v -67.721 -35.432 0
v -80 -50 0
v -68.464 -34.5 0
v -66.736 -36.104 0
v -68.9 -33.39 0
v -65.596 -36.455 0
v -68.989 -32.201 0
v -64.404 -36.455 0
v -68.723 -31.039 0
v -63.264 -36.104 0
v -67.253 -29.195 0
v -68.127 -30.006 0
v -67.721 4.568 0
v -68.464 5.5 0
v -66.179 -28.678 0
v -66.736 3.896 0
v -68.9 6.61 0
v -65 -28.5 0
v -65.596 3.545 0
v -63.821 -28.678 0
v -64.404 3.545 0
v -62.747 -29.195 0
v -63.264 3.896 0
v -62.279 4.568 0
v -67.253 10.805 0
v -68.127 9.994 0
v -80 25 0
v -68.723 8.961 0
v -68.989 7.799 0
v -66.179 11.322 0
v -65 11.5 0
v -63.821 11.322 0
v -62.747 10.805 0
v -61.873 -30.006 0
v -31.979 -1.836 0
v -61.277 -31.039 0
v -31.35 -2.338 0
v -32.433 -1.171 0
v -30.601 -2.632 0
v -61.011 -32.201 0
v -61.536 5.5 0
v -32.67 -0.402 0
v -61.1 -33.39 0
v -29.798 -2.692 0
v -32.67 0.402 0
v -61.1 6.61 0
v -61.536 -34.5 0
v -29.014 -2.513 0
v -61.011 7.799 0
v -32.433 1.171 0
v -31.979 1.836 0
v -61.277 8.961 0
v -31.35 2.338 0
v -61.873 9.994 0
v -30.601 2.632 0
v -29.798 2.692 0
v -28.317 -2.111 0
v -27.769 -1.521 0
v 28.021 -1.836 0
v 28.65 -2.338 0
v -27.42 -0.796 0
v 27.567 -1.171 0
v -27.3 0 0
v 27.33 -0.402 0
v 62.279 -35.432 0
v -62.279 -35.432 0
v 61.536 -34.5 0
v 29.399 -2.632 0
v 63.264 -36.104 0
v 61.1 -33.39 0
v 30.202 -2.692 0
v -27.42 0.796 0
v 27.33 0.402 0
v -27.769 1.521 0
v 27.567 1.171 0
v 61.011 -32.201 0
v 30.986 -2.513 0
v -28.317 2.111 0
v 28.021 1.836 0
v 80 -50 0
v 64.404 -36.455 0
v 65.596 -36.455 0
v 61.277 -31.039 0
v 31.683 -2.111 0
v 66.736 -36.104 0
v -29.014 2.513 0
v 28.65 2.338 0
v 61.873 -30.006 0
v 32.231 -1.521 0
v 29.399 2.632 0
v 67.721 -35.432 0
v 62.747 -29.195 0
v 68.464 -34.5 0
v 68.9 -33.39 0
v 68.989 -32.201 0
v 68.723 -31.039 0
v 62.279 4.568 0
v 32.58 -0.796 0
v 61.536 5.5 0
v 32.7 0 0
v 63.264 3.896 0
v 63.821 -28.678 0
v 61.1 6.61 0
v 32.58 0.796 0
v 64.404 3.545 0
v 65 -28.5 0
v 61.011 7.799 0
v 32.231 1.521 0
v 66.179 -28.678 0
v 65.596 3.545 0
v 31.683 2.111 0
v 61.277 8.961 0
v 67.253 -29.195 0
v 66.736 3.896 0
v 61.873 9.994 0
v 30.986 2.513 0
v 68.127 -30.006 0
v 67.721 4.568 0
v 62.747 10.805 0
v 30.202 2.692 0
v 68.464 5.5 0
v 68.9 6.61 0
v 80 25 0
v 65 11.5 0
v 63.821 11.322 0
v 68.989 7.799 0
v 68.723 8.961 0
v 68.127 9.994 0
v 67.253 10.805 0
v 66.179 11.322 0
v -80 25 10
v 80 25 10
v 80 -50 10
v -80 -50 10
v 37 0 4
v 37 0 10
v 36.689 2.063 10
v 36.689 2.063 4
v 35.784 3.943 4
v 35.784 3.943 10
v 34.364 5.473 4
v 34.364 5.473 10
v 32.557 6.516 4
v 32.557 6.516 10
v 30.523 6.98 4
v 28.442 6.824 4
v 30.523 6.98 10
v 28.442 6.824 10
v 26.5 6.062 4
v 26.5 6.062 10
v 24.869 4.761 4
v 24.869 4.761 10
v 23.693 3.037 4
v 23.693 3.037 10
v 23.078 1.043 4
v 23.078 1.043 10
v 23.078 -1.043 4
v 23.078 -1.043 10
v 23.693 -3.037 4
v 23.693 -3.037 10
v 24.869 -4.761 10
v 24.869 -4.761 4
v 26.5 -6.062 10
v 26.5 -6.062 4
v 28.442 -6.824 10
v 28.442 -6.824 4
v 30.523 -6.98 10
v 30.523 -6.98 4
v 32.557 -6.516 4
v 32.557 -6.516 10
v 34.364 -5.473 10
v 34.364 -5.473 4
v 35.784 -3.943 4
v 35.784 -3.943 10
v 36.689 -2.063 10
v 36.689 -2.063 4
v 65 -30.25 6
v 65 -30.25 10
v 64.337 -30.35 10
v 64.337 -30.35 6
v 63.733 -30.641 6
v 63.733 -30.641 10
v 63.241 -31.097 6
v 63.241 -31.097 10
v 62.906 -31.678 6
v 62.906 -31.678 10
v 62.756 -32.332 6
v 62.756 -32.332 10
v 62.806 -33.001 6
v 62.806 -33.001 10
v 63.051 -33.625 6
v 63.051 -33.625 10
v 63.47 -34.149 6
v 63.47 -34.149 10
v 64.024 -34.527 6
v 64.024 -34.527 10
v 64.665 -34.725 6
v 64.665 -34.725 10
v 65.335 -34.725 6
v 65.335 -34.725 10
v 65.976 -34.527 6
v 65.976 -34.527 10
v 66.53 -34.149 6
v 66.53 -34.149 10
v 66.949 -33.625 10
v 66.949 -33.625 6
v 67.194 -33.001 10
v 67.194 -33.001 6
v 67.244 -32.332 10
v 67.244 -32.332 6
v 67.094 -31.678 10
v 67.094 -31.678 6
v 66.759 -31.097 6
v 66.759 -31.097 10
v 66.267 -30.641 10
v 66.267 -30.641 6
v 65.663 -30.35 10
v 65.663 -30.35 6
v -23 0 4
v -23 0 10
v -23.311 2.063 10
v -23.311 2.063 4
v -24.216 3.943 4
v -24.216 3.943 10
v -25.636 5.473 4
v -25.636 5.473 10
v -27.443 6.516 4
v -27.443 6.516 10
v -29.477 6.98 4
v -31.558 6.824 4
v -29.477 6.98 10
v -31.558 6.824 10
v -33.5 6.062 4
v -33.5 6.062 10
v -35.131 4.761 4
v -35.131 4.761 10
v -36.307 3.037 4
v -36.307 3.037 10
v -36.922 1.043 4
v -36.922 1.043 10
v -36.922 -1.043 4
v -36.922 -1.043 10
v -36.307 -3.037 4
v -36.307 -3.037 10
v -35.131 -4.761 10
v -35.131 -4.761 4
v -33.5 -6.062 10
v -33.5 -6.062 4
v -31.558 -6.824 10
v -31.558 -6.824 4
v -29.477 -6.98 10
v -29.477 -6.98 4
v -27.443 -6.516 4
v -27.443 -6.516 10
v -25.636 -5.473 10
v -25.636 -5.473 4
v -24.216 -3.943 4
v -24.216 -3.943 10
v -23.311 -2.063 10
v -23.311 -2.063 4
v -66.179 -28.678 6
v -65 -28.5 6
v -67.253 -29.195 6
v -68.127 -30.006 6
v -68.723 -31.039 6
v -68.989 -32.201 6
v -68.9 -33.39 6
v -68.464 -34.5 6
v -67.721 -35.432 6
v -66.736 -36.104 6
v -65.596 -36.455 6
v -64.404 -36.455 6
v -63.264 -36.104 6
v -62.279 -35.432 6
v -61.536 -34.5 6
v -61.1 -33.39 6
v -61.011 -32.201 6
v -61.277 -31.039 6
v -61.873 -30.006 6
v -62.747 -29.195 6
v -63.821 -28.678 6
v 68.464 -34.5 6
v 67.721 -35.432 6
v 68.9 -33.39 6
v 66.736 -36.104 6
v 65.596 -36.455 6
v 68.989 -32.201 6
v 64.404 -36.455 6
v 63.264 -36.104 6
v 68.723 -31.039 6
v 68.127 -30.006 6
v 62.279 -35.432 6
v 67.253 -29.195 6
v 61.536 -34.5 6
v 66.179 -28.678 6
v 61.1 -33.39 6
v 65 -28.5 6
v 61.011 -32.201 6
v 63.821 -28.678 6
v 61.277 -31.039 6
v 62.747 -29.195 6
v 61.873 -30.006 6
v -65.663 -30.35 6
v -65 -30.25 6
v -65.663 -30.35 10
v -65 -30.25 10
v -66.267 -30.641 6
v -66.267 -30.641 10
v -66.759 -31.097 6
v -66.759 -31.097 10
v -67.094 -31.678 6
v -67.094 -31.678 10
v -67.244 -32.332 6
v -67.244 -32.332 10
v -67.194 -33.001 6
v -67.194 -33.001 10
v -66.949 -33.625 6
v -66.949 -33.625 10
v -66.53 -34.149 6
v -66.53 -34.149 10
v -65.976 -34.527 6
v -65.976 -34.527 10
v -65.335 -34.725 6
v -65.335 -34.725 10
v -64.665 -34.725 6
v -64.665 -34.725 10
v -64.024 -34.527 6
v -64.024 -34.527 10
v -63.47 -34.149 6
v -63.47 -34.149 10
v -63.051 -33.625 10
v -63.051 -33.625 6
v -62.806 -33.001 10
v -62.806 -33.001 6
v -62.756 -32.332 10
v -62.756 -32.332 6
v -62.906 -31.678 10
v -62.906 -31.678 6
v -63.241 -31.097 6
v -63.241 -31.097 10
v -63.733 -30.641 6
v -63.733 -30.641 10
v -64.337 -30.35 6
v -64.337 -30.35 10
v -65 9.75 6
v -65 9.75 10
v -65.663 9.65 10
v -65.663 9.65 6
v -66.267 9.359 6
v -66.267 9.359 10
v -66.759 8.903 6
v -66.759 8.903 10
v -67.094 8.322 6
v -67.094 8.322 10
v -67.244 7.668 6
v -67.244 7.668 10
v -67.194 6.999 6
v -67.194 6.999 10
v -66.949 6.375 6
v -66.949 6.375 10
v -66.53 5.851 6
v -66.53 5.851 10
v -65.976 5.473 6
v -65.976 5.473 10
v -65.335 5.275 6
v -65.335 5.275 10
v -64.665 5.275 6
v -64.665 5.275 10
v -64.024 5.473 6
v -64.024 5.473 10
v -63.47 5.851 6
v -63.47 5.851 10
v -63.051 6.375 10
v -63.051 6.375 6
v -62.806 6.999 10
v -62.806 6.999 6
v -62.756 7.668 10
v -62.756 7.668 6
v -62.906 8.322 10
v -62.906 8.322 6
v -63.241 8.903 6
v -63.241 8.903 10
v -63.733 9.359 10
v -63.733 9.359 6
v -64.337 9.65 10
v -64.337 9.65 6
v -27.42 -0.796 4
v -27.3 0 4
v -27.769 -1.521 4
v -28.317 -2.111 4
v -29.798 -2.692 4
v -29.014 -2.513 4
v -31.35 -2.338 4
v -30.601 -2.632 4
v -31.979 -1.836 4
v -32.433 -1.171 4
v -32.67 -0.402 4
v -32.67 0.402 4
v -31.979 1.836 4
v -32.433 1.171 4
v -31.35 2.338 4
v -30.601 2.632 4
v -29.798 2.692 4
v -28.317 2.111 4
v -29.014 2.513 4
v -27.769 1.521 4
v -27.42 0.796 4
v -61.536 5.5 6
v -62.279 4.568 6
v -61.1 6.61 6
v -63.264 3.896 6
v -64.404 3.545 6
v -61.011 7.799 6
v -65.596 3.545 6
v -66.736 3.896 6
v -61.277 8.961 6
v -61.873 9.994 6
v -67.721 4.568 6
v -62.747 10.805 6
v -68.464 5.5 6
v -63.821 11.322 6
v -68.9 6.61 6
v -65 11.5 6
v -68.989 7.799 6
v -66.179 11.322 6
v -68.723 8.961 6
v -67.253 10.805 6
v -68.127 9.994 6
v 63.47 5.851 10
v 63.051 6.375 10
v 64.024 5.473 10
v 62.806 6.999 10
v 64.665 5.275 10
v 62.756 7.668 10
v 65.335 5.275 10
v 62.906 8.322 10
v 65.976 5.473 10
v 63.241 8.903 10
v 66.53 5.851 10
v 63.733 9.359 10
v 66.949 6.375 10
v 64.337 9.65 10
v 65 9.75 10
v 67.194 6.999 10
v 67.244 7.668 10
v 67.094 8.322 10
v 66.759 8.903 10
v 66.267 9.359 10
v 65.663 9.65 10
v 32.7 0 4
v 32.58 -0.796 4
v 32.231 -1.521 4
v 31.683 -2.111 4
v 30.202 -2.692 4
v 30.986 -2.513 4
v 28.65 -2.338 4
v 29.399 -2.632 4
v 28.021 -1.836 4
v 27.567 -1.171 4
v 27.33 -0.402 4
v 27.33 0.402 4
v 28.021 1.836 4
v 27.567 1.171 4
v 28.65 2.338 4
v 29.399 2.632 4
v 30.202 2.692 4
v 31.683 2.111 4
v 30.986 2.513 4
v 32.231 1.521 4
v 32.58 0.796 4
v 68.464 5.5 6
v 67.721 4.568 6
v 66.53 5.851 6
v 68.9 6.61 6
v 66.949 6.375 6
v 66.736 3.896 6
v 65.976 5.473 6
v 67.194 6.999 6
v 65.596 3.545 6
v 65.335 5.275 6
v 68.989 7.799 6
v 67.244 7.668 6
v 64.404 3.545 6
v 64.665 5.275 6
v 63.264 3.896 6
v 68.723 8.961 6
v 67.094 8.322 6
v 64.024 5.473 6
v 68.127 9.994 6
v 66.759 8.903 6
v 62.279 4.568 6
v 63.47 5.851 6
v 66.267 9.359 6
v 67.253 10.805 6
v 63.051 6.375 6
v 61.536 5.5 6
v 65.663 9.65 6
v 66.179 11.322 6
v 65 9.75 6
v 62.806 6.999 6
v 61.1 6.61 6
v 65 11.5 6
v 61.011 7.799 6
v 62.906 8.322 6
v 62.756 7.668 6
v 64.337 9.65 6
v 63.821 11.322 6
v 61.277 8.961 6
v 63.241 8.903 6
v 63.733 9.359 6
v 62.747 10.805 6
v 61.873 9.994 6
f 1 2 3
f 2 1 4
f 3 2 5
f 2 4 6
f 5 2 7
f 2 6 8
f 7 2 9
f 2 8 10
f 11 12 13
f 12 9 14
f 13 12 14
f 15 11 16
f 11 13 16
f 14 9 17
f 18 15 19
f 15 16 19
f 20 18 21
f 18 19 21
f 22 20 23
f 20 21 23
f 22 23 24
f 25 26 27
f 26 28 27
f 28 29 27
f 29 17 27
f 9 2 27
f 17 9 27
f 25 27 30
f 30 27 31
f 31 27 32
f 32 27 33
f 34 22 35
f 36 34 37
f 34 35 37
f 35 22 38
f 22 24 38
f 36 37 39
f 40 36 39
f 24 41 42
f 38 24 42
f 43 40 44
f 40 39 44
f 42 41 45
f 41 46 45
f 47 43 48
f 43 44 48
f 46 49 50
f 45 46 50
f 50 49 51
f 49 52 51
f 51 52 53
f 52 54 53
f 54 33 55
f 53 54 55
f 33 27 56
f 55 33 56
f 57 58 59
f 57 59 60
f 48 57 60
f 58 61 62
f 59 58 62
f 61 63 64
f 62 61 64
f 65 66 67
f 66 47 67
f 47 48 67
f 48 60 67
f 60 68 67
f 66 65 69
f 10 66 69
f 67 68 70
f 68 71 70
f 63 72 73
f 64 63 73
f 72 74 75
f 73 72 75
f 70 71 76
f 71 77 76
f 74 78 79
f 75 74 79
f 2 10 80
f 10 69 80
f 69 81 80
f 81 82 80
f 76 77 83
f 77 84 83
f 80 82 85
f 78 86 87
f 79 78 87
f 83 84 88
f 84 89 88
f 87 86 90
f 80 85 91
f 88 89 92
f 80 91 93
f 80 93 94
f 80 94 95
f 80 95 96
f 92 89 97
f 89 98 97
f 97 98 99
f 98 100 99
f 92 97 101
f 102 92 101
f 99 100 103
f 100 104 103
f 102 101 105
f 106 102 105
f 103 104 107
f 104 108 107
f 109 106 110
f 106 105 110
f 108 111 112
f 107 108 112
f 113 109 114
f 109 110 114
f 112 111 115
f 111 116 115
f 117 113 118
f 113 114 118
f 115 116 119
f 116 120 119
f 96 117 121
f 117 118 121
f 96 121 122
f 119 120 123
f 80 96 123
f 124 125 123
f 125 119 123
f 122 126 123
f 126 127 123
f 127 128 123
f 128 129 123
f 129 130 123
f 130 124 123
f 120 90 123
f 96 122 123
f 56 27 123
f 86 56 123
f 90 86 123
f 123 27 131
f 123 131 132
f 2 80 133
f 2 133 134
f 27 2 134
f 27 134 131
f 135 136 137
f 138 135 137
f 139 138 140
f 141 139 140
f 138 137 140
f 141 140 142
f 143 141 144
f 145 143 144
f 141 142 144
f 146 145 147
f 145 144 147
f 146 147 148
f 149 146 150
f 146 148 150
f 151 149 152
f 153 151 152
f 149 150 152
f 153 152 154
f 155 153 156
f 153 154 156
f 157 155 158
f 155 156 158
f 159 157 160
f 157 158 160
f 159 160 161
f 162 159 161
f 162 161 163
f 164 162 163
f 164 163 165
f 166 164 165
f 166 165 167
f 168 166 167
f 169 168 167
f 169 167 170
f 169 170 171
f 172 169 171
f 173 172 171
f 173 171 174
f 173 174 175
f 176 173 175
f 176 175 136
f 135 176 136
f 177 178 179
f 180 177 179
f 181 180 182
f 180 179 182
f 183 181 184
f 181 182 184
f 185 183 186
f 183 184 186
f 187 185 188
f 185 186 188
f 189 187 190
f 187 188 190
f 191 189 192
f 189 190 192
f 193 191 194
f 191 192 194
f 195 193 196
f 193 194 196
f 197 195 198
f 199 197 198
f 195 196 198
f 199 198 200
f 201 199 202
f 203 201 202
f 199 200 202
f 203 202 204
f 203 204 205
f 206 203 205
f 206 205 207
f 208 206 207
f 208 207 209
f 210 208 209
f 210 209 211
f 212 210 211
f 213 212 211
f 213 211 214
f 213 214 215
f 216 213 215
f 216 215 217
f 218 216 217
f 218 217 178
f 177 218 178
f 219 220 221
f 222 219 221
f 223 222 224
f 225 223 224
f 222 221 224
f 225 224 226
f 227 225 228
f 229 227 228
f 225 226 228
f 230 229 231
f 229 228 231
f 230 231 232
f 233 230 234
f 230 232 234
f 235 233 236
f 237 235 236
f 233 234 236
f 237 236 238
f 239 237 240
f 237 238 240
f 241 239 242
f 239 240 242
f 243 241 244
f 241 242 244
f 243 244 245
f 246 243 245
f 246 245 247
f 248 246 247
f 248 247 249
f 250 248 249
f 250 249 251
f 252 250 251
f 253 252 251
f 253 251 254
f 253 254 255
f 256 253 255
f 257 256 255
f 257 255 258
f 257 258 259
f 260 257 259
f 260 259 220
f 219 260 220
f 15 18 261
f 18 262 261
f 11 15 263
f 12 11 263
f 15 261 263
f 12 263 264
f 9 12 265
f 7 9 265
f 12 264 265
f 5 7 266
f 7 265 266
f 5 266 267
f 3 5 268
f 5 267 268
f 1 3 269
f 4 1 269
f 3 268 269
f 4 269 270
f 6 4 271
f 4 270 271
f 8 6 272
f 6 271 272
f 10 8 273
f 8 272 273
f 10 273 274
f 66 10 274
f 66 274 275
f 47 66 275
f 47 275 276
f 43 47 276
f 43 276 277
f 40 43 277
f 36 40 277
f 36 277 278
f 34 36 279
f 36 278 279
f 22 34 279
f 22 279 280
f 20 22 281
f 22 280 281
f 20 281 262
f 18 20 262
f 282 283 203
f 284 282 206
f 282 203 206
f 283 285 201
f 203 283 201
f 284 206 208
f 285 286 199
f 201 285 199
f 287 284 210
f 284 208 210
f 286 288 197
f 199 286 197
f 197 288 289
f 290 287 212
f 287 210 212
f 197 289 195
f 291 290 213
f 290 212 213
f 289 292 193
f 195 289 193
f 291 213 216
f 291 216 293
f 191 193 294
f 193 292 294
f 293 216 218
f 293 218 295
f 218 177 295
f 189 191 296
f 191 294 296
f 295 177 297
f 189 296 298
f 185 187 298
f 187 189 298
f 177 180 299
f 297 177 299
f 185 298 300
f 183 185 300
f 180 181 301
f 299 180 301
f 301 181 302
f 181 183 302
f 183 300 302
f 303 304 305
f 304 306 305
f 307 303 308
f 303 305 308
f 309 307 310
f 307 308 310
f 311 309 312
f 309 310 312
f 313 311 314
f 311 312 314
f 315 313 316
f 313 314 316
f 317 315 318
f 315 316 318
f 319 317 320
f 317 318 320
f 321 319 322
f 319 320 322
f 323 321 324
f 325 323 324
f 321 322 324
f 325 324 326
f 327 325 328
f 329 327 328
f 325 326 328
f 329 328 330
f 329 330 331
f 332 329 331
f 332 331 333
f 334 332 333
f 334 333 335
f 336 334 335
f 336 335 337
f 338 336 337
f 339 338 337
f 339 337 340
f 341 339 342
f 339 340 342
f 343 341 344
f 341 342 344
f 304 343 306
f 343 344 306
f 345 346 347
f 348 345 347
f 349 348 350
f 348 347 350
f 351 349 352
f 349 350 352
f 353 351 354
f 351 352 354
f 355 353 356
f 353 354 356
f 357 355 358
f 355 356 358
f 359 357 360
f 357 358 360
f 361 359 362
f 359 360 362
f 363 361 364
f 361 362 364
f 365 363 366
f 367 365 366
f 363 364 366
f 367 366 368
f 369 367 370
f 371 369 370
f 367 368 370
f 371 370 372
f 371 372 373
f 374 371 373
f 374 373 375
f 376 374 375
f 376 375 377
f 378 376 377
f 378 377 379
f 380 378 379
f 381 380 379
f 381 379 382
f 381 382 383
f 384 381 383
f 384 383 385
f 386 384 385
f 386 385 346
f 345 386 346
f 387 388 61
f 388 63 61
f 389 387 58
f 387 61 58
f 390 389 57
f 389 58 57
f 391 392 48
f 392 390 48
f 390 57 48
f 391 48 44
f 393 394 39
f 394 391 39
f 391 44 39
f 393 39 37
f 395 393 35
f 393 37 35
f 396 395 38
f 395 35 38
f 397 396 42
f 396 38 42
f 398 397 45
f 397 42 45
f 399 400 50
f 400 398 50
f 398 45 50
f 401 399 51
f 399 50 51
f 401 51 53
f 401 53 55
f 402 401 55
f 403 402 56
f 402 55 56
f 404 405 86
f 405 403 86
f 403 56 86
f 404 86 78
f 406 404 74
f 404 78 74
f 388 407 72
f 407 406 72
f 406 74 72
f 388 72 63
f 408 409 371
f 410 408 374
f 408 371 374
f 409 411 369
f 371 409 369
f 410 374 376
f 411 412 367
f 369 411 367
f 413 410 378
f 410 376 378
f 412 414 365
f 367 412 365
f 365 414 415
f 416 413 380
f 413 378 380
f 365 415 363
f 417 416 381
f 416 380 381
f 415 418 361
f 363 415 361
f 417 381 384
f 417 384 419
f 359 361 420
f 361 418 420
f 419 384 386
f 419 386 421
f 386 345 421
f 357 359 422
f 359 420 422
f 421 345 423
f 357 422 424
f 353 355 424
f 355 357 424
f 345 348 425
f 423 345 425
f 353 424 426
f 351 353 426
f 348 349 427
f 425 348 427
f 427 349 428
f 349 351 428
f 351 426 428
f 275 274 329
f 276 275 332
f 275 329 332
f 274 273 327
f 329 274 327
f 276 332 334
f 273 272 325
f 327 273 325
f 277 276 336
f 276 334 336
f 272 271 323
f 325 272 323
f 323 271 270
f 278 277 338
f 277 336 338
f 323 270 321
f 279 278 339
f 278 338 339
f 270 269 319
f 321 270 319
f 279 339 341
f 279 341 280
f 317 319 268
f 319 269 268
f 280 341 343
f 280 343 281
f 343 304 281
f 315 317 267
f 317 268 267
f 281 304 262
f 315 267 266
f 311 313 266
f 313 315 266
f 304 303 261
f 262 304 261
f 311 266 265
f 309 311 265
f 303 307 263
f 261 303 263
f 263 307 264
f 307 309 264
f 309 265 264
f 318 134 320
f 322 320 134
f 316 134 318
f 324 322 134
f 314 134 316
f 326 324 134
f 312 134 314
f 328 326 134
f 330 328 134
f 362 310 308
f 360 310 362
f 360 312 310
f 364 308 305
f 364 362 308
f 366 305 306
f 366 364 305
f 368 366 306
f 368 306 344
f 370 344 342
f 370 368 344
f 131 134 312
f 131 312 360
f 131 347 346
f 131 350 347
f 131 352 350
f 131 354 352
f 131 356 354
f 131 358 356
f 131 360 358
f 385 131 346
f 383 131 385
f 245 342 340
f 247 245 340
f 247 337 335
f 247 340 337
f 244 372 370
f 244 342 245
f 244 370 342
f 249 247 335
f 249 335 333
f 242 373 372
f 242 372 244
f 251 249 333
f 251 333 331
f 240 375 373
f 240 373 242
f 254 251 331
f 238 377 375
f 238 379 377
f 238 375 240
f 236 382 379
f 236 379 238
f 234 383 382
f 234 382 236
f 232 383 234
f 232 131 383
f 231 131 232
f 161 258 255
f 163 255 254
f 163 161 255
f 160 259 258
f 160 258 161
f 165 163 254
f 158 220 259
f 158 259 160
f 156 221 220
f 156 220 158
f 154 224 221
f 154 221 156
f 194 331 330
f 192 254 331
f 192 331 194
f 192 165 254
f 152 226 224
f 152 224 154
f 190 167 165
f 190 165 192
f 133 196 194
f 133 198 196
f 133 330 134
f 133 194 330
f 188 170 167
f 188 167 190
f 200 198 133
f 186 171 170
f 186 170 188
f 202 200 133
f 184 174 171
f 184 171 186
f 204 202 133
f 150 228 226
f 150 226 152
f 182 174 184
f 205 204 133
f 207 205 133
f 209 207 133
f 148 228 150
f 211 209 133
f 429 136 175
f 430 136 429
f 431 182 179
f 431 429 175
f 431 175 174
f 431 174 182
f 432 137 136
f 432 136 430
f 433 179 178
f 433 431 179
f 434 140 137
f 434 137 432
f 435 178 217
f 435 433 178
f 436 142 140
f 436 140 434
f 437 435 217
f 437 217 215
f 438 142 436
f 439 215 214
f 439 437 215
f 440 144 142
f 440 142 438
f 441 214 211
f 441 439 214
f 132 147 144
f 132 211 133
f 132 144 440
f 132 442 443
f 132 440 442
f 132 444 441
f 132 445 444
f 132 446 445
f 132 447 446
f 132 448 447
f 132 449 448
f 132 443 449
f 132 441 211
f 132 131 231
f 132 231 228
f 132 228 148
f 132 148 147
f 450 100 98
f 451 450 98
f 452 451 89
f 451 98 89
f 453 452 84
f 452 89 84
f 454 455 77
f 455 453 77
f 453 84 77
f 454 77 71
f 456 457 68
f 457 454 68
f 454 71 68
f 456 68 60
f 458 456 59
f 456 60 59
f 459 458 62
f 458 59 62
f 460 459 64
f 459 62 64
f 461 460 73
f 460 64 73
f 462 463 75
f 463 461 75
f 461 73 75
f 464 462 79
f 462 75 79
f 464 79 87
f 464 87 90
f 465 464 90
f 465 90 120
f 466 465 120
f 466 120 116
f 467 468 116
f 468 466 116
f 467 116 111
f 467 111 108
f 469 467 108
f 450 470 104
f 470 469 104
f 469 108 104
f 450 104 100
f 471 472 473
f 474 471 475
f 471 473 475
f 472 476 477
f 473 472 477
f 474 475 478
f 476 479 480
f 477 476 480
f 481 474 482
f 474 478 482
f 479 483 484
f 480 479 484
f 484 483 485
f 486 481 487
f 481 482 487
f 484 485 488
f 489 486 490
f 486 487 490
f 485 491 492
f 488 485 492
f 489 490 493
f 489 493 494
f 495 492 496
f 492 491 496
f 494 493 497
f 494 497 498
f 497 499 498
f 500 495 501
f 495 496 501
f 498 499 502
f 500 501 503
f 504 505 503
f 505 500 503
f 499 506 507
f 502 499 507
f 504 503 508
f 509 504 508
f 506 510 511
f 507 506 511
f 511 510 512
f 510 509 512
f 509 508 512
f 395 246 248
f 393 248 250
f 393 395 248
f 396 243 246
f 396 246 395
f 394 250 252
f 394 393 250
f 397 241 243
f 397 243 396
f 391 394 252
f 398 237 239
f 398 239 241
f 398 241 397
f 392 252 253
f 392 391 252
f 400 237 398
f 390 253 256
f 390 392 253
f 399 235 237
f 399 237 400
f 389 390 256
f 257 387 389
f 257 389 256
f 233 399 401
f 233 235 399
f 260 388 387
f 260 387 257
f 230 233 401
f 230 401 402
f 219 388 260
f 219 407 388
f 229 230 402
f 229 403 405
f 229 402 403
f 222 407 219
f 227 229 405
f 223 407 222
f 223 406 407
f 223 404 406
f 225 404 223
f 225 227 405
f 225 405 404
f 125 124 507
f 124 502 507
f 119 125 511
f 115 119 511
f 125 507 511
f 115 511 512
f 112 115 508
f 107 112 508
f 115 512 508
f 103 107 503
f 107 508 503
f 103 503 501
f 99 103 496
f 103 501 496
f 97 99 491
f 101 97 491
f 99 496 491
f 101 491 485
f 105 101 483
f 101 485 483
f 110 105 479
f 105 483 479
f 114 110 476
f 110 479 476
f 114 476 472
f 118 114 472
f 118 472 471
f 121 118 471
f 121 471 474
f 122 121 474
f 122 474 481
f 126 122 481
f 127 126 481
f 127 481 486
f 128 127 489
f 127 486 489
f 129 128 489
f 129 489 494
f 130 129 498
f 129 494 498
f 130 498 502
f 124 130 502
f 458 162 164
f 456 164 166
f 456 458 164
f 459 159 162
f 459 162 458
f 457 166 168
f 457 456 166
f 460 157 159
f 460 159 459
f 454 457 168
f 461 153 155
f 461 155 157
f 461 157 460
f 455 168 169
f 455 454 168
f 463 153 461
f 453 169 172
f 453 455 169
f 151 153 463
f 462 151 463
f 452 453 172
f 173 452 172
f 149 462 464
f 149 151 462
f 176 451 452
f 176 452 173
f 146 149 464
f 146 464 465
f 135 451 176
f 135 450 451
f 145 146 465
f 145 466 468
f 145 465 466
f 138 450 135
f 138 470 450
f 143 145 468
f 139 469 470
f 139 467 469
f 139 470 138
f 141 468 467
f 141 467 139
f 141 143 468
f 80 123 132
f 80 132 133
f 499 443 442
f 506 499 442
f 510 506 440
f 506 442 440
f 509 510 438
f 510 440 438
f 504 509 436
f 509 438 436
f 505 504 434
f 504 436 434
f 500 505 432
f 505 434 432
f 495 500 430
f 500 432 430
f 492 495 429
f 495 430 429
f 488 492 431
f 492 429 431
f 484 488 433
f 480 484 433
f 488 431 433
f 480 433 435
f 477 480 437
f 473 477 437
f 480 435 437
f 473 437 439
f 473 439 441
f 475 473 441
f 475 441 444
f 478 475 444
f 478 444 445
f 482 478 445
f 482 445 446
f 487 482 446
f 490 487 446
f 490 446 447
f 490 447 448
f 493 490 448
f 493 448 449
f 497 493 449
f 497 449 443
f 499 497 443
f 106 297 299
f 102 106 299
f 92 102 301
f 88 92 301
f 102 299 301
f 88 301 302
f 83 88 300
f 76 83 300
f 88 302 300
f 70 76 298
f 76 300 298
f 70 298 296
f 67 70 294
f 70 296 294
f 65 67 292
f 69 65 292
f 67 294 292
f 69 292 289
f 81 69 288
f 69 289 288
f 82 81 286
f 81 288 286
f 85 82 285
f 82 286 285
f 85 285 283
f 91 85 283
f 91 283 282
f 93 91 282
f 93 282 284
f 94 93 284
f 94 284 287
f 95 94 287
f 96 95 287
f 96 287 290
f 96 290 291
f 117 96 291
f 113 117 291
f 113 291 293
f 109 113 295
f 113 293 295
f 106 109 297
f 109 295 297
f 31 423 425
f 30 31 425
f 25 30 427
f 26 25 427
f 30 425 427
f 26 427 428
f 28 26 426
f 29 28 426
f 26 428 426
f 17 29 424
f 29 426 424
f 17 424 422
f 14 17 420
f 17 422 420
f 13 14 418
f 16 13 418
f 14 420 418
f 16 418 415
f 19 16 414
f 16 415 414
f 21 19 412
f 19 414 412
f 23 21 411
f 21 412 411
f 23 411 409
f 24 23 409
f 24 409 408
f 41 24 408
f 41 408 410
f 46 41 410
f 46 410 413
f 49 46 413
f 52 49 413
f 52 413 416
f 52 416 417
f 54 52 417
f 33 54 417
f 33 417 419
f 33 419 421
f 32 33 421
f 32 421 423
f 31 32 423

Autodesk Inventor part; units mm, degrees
ref_plane "YZ Plane" through (0, 0, 0) normal (1, 0, 0) x (0, 1, 0)
ref_plane "XZ Plane" through (0, 0, 0) normal (0, 1, 0) x (-1, 0, 0)
ref_plane "XY Plane" through (0, 0, 0) normal (0, 0, 1) x (1, 0, 0)
sketch "Skizze1" plane through (0, 0, 0) normal (0, 0, 1) x (1, 0, 0)
  line L0 (-80, 25) -> (80, 25)
  line L1 (80, 25) -> (80, -50)
  line L2 (80, -50) -> (-80, -50)
  line L3 (-80, -50) -> (-80, 25)
  line L4 (-112, 0) -> (112, 0) projected
  line L5 (0, -65) -> (0, 40) projected
  circle A0 centre (-30, 0) radius 2.7
  circle A1 centre (30, 0) radius 2.7
  point P0 (0, 0)
  dimension "d0" = 25
  dimension "d1" = 160
  dimension "d2" = 60
  dimension "d3" = 5.4
  dimension "d4" = 75
extrude "Extrusion1" add sketch "Skizze1" along normal blind 10 contours L0 L5 L4 A0 L3 | L0 L1 L4 A1 L5 | L4 A0 L5 L2 L3 | L4 A1 L1 L2 L5
sketch "Skizze3" plane through (0, 0, 10) normal (0, 0, 1) x (1, 0, 0)
  circle A0 centre (30, 0) radius 2.7 projected
  circle A1 centre (-30, 0) radius 2.7 projected
  circle A2 centre (-30, 0) radius 7
  circle A3 centre (30, 0) radius 7
  point P0 (0, 0)
  dimension "d8" = 14
extrude "Extrusion2" cut sketch "Skizze3" against normal blind 6
sketch "Skizze4" plane through (0, 0, 0) normal (0, 0, -1) x (-1, 0, 0)
  line L0 (80, 25) -> (-80, 25) projected
  line L1 (-80, 25) -> (-80, -50) projected
  line L2 (-80, -50) -> (80, -50) projected
  line L3 (80, -50) -> (80, 25) projected
  line L4 (0, -50) -> (0, 25)
  line L5 (-65, -50) -> (-65, 25)
  line L6 (65, -50) -> (65, 25)
  line L7 (-80, -12.5) -> (80, -12.5)
  point P0 (0, 0)
  point P1 (-65, 7.5)
  point P2 (-65, -32.5)
  point P3 (65, -32.5)
  point P4 (65, 7.5)
  dimension "d11" = 130
  dimension "d12" = 40
hole "Bohrung1" at (65, 7.5, 0) at (65, -32.5, 0) at (-65, -32.5, 0) at (-65, 7.5, 0) direction (0, 0, 1) diameter 4.5 end through all counterbore diameter 8 counterbore depth 6
properties part number "1_0204_012"
